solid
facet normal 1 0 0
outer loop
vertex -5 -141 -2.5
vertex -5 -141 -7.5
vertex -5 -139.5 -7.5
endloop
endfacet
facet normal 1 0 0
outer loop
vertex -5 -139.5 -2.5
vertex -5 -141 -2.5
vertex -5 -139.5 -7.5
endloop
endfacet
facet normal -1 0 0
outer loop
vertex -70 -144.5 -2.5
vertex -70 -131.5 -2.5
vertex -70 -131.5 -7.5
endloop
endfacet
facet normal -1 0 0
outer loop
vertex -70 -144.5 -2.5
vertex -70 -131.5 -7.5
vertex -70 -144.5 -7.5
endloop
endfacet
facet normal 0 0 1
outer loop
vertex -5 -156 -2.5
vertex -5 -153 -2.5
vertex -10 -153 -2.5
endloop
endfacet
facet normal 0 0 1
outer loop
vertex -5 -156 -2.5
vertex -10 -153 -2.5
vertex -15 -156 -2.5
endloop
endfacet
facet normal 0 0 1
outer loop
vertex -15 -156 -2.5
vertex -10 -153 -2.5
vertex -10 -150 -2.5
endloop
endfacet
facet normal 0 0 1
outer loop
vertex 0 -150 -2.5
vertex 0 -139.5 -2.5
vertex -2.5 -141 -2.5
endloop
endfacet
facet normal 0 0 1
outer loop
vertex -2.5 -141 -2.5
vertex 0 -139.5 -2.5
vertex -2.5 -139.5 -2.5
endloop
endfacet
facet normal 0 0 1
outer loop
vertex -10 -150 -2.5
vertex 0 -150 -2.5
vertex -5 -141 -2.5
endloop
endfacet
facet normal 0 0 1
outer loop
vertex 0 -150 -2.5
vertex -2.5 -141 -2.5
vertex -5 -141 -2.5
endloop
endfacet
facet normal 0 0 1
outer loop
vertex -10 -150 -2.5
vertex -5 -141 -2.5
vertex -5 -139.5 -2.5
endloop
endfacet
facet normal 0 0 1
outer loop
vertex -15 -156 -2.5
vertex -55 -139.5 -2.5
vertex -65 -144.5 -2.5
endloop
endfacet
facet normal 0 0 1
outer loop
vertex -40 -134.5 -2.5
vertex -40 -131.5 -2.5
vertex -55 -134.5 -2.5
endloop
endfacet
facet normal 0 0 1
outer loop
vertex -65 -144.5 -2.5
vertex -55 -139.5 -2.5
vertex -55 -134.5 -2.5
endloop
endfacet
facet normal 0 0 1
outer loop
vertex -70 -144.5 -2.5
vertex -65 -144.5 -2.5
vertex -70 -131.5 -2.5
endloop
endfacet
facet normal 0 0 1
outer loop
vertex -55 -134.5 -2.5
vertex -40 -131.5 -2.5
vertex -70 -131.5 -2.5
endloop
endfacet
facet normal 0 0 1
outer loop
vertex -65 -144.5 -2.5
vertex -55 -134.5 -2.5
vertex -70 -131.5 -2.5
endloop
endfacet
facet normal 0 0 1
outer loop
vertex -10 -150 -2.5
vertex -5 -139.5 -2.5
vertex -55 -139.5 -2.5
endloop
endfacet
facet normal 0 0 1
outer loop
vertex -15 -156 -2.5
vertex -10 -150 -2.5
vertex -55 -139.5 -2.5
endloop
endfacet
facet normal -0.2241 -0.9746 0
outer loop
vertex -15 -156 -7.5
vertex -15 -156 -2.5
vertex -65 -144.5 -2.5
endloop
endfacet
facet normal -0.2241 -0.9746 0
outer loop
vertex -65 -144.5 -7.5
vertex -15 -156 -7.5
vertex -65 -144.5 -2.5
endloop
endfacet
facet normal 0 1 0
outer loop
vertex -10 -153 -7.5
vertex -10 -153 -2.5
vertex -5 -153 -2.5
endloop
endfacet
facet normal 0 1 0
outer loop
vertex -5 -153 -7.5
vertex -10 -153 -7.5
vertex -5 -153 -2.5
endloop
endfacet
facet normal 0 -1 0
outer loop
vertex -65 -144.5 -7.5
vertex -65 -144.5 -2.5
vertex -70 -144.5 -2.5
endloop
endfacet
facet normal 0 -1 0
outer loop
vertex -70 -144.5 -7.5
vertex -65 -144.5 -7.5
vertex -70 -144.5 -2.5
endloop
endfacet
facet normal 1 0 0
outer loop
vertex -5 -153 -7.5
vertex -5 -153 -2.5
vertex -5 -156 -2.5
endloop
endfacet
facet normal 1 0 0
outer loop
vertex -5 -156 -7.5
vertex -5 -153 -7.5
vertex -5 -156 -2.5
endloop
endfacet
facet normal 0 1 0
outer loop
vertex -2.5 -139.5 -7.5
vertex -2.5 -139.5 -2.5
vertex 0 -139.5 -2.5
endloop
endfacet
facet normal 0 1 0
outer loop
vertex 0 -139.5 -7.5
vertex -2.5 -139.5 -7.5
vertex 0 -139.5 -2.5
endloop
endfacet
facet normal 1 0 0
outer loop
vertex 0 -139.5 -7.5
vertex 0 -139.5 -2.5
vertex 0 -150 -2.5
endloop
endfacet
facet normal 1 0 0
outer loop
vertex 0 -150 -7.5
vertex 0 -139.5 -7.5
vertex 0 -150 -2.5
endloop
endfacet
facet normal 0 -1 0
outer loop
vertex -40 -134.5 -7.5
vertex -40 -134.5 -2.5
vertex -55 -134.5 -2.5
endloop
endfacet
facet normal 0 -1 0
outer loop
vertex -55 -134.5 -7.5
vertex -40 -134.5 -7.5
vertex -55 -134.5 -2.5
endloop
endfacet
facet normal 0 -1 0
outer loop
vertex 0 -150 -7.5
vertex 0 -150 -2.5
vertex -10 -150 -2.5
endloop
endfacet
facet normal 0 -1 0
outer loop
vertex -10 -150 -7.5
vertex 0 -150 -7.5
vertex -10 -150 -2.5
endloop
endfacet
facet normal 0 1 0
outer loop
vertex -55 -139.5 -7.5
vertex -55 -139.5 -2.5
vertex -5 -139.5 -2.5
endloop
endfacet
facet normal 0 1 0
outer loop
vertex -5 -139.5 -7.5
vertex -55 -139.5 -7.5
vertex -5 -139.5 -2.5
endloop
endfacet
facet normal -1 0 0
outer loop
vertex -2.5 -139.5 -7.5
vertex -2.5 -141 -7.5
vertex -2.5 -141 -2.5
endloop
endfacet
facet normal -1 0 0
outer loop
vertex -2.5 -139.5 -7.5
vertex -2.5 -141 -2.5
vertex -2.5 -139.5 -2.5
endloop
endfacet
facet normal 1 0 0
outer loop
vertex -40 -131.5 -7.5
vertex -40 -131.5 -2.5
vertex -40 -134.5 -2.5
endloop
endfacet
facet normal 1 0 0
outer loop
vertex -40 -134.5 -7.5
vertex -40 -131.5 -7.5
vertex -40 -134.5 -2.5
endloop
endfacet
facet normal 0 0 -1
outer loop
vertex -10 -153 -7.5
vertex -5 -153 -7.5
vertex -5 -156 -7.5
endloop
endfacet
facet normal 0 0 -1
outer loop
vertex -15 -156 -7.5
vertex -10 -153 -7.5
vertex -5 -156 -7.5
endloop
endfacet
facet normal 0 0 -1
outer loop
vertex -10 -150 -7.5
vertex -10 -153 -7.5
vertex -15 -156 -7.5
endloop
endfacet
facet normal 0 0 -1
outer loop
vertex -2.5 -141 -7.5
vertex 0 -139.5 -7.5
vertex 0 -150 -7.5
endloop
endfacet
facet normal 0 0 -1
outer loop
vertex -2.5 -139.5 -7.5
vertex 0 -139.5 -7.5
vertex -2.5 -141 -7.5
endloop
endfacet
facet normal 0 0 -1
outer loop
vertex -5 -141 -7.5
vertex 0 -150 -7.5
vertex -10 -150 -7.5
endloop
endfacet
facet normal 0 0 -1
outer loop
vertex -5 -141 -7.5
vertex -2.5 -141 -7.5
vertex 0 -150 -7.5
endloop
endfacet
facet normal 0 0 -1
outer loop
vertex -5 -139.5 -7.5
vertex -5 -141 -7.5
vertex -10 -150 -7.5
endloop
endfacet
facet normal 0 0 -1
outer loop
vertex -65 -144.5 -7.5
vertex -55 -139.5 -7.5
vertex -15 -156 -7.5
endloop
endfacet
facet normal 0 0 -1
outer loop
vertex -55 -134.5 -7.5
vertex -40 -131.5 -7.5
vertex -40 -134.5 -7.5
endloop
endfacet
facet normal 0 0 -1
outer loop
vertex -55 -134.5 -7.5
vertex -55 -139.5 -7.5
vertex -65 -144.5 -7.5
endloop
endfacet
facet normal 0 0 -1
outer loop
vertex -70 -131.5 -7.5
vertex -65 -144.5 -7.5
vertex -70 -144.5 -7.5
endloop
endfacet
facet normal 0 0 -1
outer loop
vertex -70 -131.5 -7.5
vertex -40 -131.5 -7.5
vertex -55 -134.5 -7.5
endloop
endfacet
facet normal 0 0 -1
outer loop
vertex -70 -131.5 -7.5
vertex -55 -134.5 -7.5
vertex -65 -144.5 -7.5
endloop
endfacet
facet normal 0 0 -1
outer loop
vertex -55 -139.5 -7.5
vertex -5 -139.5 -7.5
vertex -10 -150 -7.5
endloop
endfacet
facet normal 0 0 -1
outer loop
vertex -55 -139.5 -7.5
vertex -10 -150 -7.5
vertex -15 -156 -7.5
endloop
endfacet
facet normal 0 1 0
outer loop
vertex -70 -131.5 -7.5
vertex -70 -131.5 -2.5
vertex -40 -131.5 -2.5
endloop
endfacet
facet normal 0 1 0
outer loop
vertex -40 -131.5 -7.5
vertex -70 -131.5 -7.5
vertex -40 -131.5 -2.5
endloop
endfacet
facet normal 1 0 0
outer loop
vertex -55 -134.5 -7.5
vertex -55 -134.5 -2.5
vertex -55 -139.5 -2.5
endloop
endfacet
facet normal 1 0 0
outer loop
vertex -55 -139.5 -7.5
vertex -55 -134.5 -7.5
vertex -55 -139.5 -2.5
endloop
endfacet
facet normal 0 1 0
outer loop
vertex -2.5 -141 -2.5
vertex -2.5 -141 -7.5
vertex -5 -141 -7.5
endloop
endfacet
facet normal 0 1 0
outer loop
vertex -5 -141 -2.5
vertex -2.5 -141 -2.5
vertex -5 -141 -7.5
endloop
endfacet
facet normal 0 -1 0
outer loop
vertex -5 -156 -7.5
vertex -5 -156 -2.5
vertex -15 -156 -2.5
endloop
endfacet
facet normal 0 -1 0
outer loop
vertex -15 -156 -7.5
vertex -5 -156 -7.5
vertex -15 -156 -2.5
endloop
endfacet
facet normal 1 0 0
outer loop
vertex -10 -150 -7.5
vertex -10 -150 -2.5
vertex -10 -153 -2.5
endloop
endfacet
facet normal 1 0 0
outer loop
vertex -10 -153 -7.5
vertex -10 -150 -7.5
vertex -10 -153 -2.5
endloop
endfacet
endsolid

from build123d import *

# Parameters (mm, degrees)
BOSS_EXTRUDE1_DEPTH = 5
SKETCH3_W           = 2.5
SKETCH3_H           = 1.5
CUT_EXTRUDE1_DEPTH  = 172.058469536


with BuildPart() as part:
    # Sketch2 → Boss-Extrude1 (new body)
    with BuildSketch(Plane.XY.offset(-2.5)):
        Polygon((-70, -139.5), (-70, -131.5), (-40, -131.5), (-40, -134.5), (-55, -134.5), (-55, -139.5), (0, -139.5), (0, -150), (-10, -150), (-10, -153), (-5, -153), (-5, -156), (-15, -156), (-65, -144.5), (-70, -144.5), align=None)
    extrude(amount=-BOSS_EXTRUDE1_DEPTH)

    # Sketch3 → Cut-Extrude1 (cut, through all)
    with BuildSketch(Plane(origin=(0, 0, -7.5), x_dir=(-1, 0, 0), z_dir=(0, 0, -1))):
        with Locations((3.75, -140.25)):
            Rectangle(SKETCH3_W, SKETCH3_H)
    extrude(amount=-CUT_EXTRUDE1_DEPTH, mode=Mode.SUBTRACT)


solid = part.part
